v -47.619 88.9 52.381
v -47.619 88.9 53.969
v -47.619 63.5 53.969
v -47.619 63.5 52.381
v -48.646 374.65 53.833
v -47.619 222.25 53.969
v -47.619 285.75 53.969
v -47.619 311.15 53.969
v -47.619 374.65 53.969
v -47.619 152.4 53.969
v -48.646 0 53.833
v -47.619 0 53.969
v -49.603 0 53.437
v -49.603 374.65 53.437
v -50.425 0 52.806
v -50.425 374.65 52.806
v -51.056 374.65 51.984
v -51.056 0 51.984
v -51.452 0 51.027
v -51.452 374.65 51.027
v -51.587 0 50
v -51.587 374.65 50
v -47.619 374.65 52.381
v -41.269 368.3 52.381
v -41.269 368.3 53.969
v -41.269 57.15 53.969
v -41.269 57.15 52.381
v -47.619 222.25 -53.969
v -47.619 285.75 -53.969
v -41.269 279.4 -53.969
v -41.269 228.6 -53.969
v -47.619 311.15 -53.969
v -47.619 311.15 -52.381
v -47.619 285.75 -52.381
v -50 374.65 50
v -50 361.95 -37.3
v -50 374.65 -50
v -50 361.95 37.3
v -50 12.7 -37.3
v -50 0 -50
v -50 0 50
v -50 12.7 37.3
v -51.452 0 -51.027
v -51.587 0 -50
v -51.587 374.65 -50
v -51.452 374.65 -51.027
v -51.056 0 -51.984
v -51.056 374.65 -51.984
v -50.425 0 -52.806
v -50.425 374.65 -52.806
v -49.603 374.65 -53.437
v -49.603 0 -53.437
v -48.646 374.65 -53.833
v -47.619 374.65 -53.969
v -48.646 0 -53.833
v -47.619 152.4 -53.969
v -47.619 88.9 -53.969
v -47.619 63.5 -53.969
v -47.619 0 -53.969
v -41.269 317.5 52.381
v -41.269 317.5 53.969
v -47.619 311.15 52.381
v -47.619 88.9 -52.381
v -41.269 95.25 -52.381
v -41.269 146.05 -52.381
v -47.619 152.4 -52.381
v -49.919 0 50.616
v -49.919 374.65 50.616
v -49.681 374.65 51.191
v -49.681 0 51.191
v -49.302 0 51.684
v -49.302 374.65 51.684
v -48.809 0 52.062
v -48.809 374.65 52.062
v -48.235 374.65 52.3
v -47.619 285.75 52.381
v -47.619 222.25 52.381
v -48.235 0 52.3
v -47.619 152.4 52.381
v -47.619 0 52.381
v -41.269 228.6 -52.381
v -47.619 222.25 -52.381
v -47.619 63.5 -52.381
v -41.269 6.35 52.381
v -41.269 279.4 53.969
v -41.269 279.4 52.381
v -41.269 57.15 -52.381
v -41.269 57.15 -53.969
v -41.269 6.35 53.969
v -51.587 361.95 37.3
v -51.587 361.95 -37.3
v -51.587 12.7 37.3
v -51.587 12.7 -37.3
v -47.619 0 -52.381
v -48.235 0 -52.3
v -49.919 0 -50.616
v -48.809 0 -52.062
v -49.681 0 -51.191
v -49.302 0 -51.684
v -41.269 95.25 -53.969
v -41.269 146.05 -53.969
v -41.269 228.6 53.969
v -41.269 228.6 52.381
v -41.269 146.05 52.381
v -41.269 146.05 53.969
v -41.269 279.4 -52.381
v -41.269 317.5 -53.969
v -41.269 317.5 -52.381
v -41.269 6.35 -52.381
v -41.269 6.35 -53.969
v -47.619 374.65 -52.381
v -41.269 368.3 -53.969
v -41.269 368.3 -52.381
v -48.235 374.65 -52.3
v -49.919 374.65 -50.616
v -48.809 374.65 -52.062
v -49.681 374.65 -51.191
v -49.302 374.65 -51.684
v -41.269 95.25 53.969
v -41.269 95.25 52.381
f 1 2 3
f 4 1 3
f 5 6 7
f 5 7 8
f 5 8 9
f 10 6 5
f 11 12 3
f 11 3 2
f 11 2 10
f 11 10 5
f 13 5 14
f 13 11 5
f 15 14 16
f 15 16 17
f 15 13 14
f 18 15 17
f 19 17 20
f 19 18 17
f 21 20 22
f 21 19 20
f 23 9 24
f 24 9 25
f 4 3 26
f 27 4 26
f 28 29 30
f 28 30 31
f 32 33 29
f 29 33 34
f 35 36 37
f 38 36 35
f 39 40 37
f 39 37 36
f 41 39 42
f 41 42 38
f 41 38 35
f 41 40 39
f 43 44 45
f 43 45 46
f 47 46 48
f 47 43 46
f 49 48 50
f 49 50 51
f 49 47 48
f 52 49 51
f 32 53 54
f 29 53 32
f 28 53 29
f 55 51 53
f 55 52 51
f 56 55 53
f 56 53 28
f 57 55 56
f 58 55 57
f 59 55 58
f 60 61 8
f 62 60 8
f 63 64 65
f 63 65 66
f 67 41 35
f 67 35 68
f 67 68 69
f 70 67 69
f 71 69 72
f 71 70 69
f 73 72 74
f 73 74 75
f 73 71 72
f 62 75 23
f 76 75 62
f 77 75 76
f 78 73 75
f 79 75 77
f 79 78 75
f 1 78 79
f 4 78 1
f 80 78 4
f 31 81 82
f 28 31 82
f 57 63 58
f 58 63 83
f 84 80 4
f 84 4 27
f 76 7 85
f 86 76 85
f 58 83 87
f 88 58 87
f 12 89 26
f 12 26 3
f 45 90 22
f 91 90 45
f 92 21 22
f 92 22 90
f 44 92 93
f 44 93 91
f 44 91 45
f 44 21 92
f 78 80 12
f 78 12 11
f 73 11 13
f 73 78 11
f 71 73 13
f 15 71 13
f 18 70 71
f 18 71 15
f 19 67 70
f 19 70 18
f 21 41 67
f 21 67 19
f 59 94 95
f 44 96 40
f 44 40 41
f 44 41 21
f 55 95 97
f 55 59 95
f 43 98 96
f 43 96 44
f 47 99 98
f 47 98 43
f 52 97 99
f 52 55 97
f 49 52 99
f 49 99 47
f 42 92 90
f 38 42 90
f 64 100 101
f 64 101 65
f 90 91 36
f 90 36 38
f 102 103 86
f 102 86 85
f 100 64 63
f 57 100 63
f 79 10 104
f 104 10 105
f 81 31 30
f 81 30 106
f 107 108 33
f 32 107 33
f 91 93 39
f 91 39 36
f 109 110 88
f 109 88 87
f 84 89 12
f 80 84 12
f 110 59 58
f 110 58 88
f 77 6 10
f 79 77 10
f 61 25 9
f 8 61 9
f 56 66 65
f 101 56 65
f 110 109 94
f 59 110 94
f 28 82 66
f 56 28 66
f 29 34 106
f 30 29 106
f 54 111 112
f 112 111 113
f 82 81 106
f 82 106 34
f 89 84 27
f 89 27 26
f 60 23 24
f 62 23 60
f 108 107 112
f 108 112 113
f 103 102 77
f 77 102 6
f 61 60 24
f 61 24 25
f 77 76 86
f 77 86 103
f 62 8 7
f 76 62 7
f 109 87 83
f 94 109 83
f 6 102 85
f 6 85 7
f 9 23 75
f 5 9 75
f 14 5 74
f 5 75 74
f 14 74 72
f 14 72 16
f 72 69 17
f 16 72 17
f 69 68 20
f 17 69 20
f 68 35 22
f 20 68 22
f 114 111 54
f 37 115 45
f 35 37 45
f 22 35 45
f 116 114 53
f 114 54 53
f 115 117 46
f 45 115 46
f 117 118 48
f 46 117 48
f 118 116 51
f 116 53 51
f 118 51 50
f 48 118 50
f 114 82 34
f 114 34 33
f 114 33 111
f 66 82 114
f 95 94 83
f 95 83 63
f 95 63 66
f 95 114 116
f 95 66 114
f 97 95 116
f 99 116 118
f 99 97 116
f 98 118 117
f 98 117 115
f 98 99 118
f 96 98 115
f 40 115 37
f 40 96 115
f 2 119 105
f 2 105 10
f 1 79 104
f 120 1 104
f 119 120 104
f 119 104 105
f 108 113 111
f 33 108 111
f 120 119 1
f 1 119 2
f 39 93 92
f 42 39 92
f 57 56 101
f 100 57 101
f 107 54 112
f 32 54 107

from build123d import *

# Parameters (mm, degrees)
MAINPLATEEXTRUDE_DEPTH = 374.65
FLANGECUT_DEPTH        = 107.95
SKETCH3_W              = 74.5998
SKETCH3_H              = 349.25
CUT_EXTRUDE2_DEPTH     = 1.5875


with BuildPart() as part:
    # Sketch1 → MainPlateExtrude (new body)
    with BuildSketch(Plane(origin=(0, 0, 0), x_dir=(1, 0, 0), z_dir=(0, 1, 0))):
        with BuildLine():
            Line((-47.61865, -52.38115), (-41.26865, -52.38115))
            Line((-41.26865, -52.38115), (-41.26865, -53.96865))
            Line((-41.26865, -53.96865), (-47.61865, -53.96865))
            ThreePointArc((-47.61865, -53.96865), (-50.424980038, -52.806230038), (-51.5874, -49.9999))
            Line((-51.5874, -49.9999), (-51.5874, 49.9999))
            ThreePointArc((-51.5874, 49.9999), (-50.424980038, 52.806230038), (-47.61865, 53.96865))
            Line((-47.61865, 53.96865), (-41.26865, 53.96865))
            Line((-41.26865, 53.96865), (-41.26865, 52.38115))
            Line((-41.26865, 52.38115), (-47.61865, 52.38115))
            ThreePointArc((-47.61865, 52.38115), (-49.302448023, 51.683698023), (-49.9999, 49.9999))
            Line((-49.9999, 49.9999), (-49.9999, -49.9999))
            ThreePointArc((-49.9999, -49.9999), (-49.302448023, -51.683698023), (-47.61865, -52.38115))
        make_face()
    extrude(amount=MAINPLATEEXTRUDE_DEPTH)

    # Sketch2 → FlangeCut (cut)
    with BuildSketch(Plane.XY.offset(53.96865)):
        Polygon((-41.26865, 95.25), (-47.61865, 88.9), (-47.61865, 63.5), (-41.26865, 57.15), align=None)
        Polygon((-41.26865, 6.35), (-47.61865, 0), (-41.26865, 0), align=None)
        Polygon((-41.26865, 228.6), (-47.61865, 222.25), (-47.61865, 152.4), (-41.26865, 146.05), align=None)
        Polygon((-41.26865, 317.5), (-47.61865, 311.15), (-47.61865, 285.75), (-41.26865, 279.4), align=None)
        Polygon((-41.26865, 374.65), (-47.61865, 374.65), (-41.26865, 368.3), align=None)
    extrude(amount=-FLANGECUT_DEPTH, mode=Mode.SUBTRACT)

    # Sketch3 → Cut-Extrude2 (cut)
    with BuildSketch(Plane.ZY.offset(51.5874)):
        with Locations((0, 187.325)):
            Rectangle(SKETCH3_W, SKETCH3_H)
    extrude(amount=-CUT_EXTRUDE2_DEPTH, mode=Mode.SUBTRACT)


solid = part.part
